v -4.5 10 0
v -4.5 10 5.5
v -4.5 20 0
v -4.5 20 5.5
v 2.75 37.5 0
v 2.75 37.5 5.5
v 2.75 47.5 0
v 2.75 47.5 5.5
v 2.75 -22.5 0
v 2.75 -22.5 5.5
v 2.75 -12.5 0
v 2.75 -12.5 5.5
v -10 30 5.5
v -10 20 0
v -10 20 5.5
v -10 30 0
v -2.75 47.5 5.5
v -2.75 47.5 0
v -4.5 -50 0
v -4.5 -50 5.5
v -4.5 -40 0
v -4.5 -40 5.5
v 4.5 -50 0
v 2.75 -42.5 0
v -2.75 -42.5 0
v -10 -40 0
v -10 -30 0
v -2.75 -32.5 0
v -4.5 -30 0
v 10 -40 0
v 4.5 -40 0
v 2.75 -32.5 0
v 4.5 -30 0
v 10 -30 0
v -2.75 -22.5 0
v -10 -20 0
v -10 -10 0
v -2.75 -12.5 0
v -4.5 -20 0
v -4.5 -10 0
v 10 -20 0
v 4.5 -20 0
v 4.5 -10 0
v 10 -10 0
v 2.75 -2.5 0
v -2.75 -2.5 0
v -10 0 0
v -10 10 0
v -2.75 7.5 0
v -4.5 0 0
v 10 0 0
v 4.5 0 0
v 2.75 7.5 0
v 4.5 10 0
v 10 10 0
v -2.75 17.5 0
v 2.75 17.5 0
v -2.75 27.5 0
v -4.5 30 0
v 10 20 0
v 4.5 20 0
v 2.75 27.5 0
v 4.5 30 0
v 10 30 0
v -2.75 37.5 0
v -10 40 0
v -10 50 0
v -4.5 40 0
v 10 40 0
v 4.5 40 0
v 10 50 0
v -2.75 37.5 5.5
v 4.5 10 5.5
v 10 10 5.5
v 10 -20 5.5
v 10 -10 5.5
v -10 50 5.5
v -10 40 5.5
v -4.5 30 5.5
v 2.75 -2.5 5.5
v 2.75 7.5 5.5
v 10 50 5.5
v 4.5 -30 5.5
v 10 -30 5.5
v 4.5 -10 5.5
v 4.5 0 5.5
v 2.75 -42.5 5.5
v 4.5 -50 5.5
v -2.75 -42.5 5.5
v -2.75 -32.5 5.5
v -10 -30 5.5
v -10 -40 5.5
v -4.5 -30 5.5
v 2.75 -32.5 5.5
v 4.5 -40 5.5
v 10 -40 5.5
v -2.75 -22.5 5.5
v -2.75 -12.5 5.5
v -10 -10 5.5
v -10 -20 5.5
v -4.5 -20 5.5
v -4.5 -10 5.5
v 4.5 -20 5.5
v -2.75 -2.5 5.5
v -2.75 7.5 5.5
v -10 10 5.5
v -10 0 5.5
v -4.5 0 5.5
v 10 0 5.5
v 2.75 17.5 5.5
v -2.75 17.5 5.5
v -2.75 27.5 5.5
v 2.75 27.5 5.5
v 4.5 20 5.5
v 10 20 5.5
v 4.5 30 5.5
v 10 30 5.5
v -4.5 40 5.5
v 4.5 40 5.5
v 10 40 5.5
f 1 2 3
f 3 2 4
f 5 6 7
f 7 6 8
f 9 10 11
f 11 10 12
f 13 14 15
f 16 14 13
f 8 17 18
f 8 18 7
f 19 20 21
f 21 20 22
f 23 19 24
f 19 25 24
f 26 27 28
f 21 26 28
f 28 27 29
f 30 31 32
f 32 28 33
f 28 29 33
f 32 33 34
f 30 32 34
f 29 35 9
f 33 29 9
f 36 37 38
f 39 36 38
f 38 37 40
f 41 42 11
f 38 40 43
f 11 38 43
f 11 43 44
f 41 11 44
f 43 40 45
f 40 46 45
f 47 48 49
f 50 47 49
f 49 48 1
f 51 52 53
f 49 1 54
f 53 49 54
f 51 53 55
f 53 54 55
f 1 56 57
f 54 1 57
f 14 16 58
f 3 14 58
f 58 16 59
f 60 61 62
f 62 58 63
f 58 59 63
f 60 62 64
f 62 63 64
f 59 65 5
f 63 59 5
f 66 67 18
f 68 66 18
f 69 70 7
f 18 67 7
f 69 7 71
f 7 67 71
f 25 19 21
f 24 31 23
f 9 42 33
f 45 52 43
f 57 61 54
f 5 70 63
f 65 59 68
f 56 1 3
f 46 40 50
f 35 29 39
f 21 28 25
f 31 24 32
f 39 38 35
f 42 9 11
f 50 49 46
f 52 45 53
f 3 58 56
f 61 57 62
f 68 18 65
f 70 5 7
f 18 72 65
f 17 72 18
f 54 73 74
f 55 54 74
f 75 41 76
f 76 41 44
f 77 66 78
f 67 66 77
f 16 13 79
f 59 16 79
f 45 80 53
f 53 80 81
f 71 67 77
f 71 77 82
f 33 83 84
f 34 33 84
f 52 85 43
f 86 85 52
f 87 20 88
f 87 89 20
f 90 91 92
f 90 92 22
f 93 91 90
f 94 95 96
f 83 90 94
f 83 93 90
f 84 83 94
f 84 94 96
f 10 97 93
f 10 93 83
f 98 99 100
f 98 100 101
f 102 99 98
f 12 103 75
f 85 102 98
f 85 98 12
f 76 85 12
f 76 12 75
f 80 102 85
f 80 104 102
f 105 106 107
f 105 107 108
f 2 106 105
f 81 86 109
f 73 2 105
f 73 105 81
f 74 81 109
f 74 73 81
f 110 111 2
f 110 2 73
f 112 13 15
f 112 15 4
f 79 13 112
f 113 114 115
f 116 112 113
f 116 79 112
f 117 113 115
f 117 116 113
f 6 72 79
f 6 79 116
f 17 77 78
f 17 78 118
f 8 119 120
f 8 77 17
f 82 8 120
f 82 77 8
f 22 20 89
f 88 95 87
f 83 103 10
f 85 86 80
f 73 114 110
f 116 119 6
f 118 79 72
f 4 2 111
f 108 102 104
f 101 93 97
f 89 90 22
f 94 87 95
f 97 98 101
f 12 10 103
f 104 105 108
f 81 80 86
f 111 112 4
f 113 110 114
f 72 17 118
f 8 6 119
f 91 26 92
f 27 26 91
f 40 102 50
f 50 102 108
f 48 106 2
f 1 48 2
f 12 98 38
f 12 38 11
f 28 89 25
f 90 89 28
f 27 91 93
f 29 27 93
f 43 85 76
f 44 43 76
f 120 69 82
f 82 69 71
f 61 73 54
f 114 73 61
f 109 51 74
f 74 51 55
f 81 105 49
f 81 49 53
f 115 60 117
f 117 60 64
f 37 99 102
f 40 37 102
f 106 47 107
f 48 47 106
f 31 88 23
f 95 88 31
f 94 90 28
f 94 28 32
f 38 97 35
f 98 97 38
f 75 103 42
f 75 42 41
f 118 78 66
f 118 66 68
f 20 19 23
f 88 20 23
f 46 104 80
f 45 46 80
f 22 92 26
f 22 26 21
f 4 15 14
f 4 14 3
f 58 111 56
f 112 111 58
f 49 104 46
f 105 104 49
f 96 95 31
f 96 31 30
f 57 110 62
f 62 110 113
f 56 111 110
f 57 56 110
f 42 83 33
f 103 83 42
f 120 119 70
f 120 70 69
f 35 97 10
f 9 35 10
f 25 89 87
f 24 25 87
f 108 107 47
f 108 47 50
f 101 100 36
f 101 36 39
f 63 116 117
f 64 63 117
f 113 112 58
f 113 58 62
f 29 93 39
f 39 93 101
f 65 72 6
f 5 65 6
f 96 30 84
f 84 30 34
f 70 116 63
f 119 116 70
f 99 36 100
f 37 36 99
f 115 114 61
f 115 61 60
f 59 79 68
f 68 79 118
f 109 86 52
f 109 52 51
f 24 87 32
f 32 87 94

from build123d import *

# Parameters (mm, degrees)
SKETCH_1_W          = 20
SKETCH_1_H          = 100
EXTRUDE_1_DEPTH     = 5.5
SKETCH_2_W          = 5.5
SKETCH_2_H          = 10
CUT_EXTRUDE_1_DEPTH = 52.285962992
SKETCH_3_W          = 5.5
SKETCH_3_H          = 10
CUT_EXTRUDE_2_DEPTH = 52.285962992


with BuildPart() as part:
    # ｽｹｯﾁ1 → ﾎﾞｽ - 押し出し1 (new body)
    with BuildSketch(Plane.XY):
        Rectangle(SKETCH_1_W, SKETCH_1_H)
    extrude(amount=EXTRUDE_1_DEPTH)

    # ｽｹｯﾁ2 → ｶｯﾄ - 押し出し1 (cut, through all)
    with BuildSketch(Plane.XY.offset(5.5)):
        with Locations((-7.25, 35)):
            Rectangle(SKETCH_2_W, SKETCH_2_H)
        with Locations((-7.25, 15)):
            Rectangle(SKETCH_2_W, SKETCH_2_H)
        with Locations((-7.25, -5)):
            Rectangle(SKETCH_2_W, SKETCH_2_H)
        with Locations((-7.25, -25)):
            Rectangle(SKETCH_2_W, SKETCH_2_H)
        with Locations((7.25, -25)):
            Rectangle(SKETCH_2_W, SKETCH_2_H)
        with Locations((7.25, -5)):
            Rectangle(SKETCH_2_W, SKETCH_2_H)
        with Locations((7.25, 15)):
            Rectangle(SKETCH_2_W, SKETCH_2_H)
        with Locations((7.25, 35)):
            Rectangle(SKETCH_2_W, SKETCH_2_H)
        with Locations((-7.25, -45)):
            Rectangle(SKETCH_2_W, SKETCH_2_H)
        with Locations((7.25, -45)):
            Rectangle(SKETCH_2_W, SKETCH_2_H)
    extrude(amount=-CUT_EXTRUDE_1_DEPTH, mode=Mode.SUBTRACT)

    # ｽｹｯﾁ3 → ｶｯﾄ - 押し出し2 (cut, through all)
    with BuildSketch(Plane.XY.offset(5.5)):
        with Locations((0, -37.5)):
            Rectangle(SKETCH_3_W, SKETCH_3_H)
        with Locations((0, -17.5)):
            Rectangle(SKETCH_3_W, SKETCH_3_H)
        with Locations((0, 2.5)):
            Rectangle(SKETCH_3_W, SKETCH_3_H)
        with Locations((0, 22.5)):
            Rectangle(SKETCH_3_W, SKETCH_3_H)
        with Locations((0, 42.5)):
            Rectangle(SKETCH_3_W, SKETCH_3_H)
    extrude(amount=-CUT_EXTRUDE_2_DEPTH, mode=Mode.SUBTRACT)


solid = part.part
